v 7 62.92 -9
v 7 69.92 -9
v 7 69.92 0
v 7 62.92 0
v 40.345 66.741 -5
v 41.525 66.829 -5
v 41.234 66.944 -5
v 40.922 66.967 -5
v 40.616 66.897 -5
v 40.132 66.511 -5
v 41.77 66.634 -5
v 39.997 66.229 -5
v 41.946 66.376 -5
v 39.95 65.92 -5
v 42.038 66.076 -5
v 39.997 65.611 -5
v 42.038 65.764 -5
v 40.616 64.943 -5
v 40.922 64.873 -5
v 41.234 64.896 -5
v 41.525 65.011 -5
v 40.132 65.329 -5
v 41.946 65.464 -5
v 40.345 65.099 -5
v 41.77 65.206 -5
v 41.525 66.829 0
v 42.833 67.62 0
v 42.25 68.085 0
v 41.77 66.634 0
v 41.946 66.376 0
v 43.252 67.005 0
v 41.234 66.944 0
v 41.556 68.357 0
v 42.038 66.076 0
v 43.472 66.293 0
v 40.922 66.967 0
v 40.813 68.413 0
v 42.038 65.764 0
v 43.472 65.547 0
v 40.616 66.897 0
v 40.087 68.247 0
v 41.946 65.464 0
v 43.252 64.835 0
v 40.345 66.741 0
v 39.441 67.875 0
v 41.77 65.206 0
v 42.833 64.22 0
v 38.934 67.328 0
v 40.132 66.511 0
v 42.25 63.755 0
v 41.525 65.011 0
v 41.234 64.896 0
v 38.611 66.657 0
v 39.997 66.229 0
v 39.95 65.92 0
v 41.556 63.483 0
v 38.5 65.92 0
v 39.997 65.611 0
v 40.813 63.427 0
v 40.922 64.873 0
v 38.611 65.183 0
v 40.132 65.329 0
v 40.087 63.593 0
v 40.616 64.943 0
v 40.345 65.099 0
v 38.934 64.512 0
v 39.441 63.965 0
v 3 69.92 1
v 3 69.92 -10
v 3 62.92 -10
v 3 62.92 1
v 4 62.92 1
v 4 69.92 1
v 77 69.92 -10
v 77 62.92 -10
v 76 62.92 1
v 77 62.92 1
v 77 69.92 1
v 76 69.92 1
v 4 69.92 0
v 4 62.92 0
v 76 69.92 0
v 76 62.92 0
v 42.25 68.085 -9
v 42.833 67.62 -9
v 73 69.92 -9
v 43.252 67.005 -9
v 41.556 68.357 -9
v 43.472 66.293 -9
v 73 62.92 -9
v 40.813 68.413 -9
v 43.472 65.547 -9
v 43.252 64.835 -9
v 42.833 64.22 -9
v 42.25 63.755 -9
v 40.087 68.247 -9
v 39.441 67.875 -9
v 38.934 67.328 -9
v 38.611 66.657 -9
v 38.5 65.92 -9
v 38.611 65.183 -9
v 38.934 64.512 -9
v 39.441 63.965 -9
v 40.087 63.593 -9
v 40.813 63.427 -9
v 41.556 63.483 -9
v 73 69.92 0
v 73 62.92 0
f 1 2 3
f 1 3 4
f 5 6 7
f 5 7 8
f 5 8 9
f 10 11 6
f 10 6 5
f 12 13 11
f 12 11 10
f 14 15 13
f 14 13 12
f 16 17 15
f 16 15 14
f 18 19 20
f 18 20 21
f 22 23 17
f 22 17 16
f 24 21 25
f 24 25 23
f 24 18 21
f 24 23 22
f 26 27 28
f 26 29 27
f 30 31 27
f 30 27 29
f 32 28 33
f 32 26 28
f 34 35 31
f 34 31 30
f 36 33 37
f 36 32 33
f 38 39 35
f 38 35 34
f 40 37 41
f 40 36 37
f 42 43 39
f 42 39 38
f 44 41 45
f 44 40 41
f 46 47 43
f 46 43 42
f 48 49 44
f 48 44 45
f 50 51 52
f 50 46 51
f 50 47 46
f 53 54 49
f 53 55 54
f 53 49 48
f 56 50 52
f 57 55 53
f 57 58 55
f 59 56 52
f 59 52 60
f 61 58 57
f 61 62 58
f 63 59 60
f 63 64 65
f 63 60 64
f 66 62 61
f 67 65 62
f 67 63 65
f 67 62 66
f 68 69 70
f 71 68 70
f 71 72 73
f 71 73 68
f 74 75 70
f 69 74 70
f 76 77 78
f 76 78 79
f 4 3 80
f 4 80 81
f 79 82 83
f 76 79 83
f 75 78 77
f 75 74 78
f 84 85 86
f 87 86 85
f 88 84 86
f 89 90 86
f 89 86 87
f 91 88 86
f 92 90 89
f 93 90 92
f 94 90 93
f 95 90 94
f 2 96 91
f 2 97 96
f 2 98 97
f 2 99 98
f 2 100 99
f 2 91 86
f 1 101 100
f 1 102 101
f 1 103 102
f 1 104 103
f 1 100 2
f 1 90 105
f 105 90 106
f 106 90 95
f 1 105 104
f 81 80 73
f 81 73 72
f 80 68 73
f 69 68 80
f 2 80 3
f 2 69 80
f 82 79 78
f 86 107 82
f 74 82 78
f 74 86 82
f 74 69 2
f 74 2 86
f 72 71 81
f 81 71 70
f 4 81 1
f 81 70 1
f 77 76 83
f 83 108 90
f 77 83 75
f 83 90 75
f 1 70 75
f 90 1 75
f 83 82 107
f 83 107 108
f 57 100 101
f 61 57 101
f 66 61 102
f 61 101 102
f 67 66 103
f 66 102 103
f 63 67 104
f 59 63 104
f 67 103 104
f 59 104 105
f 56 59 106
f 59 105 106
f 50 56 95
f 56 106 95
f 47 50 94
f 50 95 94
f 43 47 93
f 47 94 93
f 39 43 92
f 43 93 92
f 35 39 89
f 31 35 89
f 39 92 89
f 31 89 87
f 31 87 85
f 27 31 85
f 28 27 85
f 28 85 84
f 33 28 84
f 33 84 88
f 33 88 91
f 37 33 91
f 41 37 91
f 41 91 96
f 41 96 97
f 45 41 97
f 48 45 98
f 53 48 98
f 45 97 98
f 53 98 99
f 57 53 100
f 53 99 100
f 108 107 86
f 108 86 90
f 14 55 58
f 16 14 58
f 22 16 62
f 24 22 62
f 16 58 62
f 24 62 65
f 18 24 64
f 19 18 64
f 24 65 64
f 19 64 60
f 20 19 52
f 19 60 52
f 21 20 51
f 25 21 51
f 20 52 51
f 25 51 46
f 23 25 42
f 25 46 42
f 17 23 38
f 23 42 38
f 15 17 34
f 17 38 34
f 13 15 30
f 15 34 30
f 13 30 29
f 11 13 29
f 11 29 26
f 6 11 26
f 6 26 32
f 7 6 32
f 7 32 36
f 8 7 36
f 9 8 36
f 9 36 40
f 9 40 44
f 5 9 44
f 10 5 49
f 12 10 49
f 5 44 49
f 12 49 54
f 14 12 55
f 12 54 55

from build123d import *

# Parameters (mm, degrees)
SKETCH027_W             = 74
SKETCH027_H             = 7
PAD018_DEPTH            = 1
SKETCH028_W             = 1
SKETCH028_H             = 7
PAD016_DEPTH            = 10
PAD016_FACE6_W          = 7
PAD016_FACE6_H          = 72
PAD019_DEPTH            = 9
SKETCH031_W             = 66
SKETCH031_H             = 7
POCKET009_DEPTH         = 9
SKETCH032_R             = 2.5
PAD020_DEPTH            = 9
SKETCH030_R             = 1.05
POCKET010_DEPTH         = 5
BODY006_PLACEMENT_ANGLE = 180


with BuildPart() as part:
    # Sketch027 → Pad018 (new body)
    with BuildSketch(Plane.XY):
        with Locations((35, 4.58)):
            Rectangle(SKETCH027_W, SKETCH027_H)
    extrude(amount=PAD018_DEPTH)

    # Sketch028 (on Face6 of Pad018) → Pad016 (join)
    with BuildSketch(Plane.XY.offset(1)):
        with Locations((-1.5, 4.58)):
            Rectangle(SKETCH028_W, SKETCH028_H)
        with Locations((71.5, 4.58)):
            Rectangle(SKETCH028_W, SKETCH028_H)
    extrude(amount=PAD016_DEPTH)

    # Pad016 Face6 → Pad019 (add)
    with BuildSketch(Plane(origin=(35, 4.58, 1), x_dir=(0, 1, 0), z_dir=(0, 0, 1))):
        Rectangle(PAD016_FACE6_W, PAD016_FACE6_H)
    extrude(amount=PAD019_DEPTH)

    # Sketch031 (on Face13 of Pad019) → Pocket009 (cut)
    with BuildSketch(Plane.XY.offset(10)):
        with Locations((35, 4.58)):
            Rectangle(SKETCH031_W, SKETCH031_H)
    extrude(amount=-POCKET009_DEPTH, mode=Mode.SUBTRACT)

    # Sketch032 (on Face7 of Pocket009) → Pad020 (join)
    with BuildSketch(Plane.XY.offset(1)):
        with Locations((34, 5.08)):
            Circle(SKETCH032_R)
    extrude(amount=PAD020_DEPTH)

    # Sketch030 (on Face26 of Pad020) → Pocket010 (cut)
    with BuildSketch(Plane.XY.offset(10)):
        with Locations((34, 5.08)):
            Circle(SKETCH030_R)
    extrude(amount=-POCKET010_DEPTH, mode=Mode.SUBTRACT)


with BuildPart() as part_1:
    # Body006 placement: moved
    add(part.part.moved(Location((75, 71, -10))).rotate(Axis((75, 71, -10), (0, 0, 1)), BODY006_PLACEMENT_ANGLE))


solid = part_1.part
